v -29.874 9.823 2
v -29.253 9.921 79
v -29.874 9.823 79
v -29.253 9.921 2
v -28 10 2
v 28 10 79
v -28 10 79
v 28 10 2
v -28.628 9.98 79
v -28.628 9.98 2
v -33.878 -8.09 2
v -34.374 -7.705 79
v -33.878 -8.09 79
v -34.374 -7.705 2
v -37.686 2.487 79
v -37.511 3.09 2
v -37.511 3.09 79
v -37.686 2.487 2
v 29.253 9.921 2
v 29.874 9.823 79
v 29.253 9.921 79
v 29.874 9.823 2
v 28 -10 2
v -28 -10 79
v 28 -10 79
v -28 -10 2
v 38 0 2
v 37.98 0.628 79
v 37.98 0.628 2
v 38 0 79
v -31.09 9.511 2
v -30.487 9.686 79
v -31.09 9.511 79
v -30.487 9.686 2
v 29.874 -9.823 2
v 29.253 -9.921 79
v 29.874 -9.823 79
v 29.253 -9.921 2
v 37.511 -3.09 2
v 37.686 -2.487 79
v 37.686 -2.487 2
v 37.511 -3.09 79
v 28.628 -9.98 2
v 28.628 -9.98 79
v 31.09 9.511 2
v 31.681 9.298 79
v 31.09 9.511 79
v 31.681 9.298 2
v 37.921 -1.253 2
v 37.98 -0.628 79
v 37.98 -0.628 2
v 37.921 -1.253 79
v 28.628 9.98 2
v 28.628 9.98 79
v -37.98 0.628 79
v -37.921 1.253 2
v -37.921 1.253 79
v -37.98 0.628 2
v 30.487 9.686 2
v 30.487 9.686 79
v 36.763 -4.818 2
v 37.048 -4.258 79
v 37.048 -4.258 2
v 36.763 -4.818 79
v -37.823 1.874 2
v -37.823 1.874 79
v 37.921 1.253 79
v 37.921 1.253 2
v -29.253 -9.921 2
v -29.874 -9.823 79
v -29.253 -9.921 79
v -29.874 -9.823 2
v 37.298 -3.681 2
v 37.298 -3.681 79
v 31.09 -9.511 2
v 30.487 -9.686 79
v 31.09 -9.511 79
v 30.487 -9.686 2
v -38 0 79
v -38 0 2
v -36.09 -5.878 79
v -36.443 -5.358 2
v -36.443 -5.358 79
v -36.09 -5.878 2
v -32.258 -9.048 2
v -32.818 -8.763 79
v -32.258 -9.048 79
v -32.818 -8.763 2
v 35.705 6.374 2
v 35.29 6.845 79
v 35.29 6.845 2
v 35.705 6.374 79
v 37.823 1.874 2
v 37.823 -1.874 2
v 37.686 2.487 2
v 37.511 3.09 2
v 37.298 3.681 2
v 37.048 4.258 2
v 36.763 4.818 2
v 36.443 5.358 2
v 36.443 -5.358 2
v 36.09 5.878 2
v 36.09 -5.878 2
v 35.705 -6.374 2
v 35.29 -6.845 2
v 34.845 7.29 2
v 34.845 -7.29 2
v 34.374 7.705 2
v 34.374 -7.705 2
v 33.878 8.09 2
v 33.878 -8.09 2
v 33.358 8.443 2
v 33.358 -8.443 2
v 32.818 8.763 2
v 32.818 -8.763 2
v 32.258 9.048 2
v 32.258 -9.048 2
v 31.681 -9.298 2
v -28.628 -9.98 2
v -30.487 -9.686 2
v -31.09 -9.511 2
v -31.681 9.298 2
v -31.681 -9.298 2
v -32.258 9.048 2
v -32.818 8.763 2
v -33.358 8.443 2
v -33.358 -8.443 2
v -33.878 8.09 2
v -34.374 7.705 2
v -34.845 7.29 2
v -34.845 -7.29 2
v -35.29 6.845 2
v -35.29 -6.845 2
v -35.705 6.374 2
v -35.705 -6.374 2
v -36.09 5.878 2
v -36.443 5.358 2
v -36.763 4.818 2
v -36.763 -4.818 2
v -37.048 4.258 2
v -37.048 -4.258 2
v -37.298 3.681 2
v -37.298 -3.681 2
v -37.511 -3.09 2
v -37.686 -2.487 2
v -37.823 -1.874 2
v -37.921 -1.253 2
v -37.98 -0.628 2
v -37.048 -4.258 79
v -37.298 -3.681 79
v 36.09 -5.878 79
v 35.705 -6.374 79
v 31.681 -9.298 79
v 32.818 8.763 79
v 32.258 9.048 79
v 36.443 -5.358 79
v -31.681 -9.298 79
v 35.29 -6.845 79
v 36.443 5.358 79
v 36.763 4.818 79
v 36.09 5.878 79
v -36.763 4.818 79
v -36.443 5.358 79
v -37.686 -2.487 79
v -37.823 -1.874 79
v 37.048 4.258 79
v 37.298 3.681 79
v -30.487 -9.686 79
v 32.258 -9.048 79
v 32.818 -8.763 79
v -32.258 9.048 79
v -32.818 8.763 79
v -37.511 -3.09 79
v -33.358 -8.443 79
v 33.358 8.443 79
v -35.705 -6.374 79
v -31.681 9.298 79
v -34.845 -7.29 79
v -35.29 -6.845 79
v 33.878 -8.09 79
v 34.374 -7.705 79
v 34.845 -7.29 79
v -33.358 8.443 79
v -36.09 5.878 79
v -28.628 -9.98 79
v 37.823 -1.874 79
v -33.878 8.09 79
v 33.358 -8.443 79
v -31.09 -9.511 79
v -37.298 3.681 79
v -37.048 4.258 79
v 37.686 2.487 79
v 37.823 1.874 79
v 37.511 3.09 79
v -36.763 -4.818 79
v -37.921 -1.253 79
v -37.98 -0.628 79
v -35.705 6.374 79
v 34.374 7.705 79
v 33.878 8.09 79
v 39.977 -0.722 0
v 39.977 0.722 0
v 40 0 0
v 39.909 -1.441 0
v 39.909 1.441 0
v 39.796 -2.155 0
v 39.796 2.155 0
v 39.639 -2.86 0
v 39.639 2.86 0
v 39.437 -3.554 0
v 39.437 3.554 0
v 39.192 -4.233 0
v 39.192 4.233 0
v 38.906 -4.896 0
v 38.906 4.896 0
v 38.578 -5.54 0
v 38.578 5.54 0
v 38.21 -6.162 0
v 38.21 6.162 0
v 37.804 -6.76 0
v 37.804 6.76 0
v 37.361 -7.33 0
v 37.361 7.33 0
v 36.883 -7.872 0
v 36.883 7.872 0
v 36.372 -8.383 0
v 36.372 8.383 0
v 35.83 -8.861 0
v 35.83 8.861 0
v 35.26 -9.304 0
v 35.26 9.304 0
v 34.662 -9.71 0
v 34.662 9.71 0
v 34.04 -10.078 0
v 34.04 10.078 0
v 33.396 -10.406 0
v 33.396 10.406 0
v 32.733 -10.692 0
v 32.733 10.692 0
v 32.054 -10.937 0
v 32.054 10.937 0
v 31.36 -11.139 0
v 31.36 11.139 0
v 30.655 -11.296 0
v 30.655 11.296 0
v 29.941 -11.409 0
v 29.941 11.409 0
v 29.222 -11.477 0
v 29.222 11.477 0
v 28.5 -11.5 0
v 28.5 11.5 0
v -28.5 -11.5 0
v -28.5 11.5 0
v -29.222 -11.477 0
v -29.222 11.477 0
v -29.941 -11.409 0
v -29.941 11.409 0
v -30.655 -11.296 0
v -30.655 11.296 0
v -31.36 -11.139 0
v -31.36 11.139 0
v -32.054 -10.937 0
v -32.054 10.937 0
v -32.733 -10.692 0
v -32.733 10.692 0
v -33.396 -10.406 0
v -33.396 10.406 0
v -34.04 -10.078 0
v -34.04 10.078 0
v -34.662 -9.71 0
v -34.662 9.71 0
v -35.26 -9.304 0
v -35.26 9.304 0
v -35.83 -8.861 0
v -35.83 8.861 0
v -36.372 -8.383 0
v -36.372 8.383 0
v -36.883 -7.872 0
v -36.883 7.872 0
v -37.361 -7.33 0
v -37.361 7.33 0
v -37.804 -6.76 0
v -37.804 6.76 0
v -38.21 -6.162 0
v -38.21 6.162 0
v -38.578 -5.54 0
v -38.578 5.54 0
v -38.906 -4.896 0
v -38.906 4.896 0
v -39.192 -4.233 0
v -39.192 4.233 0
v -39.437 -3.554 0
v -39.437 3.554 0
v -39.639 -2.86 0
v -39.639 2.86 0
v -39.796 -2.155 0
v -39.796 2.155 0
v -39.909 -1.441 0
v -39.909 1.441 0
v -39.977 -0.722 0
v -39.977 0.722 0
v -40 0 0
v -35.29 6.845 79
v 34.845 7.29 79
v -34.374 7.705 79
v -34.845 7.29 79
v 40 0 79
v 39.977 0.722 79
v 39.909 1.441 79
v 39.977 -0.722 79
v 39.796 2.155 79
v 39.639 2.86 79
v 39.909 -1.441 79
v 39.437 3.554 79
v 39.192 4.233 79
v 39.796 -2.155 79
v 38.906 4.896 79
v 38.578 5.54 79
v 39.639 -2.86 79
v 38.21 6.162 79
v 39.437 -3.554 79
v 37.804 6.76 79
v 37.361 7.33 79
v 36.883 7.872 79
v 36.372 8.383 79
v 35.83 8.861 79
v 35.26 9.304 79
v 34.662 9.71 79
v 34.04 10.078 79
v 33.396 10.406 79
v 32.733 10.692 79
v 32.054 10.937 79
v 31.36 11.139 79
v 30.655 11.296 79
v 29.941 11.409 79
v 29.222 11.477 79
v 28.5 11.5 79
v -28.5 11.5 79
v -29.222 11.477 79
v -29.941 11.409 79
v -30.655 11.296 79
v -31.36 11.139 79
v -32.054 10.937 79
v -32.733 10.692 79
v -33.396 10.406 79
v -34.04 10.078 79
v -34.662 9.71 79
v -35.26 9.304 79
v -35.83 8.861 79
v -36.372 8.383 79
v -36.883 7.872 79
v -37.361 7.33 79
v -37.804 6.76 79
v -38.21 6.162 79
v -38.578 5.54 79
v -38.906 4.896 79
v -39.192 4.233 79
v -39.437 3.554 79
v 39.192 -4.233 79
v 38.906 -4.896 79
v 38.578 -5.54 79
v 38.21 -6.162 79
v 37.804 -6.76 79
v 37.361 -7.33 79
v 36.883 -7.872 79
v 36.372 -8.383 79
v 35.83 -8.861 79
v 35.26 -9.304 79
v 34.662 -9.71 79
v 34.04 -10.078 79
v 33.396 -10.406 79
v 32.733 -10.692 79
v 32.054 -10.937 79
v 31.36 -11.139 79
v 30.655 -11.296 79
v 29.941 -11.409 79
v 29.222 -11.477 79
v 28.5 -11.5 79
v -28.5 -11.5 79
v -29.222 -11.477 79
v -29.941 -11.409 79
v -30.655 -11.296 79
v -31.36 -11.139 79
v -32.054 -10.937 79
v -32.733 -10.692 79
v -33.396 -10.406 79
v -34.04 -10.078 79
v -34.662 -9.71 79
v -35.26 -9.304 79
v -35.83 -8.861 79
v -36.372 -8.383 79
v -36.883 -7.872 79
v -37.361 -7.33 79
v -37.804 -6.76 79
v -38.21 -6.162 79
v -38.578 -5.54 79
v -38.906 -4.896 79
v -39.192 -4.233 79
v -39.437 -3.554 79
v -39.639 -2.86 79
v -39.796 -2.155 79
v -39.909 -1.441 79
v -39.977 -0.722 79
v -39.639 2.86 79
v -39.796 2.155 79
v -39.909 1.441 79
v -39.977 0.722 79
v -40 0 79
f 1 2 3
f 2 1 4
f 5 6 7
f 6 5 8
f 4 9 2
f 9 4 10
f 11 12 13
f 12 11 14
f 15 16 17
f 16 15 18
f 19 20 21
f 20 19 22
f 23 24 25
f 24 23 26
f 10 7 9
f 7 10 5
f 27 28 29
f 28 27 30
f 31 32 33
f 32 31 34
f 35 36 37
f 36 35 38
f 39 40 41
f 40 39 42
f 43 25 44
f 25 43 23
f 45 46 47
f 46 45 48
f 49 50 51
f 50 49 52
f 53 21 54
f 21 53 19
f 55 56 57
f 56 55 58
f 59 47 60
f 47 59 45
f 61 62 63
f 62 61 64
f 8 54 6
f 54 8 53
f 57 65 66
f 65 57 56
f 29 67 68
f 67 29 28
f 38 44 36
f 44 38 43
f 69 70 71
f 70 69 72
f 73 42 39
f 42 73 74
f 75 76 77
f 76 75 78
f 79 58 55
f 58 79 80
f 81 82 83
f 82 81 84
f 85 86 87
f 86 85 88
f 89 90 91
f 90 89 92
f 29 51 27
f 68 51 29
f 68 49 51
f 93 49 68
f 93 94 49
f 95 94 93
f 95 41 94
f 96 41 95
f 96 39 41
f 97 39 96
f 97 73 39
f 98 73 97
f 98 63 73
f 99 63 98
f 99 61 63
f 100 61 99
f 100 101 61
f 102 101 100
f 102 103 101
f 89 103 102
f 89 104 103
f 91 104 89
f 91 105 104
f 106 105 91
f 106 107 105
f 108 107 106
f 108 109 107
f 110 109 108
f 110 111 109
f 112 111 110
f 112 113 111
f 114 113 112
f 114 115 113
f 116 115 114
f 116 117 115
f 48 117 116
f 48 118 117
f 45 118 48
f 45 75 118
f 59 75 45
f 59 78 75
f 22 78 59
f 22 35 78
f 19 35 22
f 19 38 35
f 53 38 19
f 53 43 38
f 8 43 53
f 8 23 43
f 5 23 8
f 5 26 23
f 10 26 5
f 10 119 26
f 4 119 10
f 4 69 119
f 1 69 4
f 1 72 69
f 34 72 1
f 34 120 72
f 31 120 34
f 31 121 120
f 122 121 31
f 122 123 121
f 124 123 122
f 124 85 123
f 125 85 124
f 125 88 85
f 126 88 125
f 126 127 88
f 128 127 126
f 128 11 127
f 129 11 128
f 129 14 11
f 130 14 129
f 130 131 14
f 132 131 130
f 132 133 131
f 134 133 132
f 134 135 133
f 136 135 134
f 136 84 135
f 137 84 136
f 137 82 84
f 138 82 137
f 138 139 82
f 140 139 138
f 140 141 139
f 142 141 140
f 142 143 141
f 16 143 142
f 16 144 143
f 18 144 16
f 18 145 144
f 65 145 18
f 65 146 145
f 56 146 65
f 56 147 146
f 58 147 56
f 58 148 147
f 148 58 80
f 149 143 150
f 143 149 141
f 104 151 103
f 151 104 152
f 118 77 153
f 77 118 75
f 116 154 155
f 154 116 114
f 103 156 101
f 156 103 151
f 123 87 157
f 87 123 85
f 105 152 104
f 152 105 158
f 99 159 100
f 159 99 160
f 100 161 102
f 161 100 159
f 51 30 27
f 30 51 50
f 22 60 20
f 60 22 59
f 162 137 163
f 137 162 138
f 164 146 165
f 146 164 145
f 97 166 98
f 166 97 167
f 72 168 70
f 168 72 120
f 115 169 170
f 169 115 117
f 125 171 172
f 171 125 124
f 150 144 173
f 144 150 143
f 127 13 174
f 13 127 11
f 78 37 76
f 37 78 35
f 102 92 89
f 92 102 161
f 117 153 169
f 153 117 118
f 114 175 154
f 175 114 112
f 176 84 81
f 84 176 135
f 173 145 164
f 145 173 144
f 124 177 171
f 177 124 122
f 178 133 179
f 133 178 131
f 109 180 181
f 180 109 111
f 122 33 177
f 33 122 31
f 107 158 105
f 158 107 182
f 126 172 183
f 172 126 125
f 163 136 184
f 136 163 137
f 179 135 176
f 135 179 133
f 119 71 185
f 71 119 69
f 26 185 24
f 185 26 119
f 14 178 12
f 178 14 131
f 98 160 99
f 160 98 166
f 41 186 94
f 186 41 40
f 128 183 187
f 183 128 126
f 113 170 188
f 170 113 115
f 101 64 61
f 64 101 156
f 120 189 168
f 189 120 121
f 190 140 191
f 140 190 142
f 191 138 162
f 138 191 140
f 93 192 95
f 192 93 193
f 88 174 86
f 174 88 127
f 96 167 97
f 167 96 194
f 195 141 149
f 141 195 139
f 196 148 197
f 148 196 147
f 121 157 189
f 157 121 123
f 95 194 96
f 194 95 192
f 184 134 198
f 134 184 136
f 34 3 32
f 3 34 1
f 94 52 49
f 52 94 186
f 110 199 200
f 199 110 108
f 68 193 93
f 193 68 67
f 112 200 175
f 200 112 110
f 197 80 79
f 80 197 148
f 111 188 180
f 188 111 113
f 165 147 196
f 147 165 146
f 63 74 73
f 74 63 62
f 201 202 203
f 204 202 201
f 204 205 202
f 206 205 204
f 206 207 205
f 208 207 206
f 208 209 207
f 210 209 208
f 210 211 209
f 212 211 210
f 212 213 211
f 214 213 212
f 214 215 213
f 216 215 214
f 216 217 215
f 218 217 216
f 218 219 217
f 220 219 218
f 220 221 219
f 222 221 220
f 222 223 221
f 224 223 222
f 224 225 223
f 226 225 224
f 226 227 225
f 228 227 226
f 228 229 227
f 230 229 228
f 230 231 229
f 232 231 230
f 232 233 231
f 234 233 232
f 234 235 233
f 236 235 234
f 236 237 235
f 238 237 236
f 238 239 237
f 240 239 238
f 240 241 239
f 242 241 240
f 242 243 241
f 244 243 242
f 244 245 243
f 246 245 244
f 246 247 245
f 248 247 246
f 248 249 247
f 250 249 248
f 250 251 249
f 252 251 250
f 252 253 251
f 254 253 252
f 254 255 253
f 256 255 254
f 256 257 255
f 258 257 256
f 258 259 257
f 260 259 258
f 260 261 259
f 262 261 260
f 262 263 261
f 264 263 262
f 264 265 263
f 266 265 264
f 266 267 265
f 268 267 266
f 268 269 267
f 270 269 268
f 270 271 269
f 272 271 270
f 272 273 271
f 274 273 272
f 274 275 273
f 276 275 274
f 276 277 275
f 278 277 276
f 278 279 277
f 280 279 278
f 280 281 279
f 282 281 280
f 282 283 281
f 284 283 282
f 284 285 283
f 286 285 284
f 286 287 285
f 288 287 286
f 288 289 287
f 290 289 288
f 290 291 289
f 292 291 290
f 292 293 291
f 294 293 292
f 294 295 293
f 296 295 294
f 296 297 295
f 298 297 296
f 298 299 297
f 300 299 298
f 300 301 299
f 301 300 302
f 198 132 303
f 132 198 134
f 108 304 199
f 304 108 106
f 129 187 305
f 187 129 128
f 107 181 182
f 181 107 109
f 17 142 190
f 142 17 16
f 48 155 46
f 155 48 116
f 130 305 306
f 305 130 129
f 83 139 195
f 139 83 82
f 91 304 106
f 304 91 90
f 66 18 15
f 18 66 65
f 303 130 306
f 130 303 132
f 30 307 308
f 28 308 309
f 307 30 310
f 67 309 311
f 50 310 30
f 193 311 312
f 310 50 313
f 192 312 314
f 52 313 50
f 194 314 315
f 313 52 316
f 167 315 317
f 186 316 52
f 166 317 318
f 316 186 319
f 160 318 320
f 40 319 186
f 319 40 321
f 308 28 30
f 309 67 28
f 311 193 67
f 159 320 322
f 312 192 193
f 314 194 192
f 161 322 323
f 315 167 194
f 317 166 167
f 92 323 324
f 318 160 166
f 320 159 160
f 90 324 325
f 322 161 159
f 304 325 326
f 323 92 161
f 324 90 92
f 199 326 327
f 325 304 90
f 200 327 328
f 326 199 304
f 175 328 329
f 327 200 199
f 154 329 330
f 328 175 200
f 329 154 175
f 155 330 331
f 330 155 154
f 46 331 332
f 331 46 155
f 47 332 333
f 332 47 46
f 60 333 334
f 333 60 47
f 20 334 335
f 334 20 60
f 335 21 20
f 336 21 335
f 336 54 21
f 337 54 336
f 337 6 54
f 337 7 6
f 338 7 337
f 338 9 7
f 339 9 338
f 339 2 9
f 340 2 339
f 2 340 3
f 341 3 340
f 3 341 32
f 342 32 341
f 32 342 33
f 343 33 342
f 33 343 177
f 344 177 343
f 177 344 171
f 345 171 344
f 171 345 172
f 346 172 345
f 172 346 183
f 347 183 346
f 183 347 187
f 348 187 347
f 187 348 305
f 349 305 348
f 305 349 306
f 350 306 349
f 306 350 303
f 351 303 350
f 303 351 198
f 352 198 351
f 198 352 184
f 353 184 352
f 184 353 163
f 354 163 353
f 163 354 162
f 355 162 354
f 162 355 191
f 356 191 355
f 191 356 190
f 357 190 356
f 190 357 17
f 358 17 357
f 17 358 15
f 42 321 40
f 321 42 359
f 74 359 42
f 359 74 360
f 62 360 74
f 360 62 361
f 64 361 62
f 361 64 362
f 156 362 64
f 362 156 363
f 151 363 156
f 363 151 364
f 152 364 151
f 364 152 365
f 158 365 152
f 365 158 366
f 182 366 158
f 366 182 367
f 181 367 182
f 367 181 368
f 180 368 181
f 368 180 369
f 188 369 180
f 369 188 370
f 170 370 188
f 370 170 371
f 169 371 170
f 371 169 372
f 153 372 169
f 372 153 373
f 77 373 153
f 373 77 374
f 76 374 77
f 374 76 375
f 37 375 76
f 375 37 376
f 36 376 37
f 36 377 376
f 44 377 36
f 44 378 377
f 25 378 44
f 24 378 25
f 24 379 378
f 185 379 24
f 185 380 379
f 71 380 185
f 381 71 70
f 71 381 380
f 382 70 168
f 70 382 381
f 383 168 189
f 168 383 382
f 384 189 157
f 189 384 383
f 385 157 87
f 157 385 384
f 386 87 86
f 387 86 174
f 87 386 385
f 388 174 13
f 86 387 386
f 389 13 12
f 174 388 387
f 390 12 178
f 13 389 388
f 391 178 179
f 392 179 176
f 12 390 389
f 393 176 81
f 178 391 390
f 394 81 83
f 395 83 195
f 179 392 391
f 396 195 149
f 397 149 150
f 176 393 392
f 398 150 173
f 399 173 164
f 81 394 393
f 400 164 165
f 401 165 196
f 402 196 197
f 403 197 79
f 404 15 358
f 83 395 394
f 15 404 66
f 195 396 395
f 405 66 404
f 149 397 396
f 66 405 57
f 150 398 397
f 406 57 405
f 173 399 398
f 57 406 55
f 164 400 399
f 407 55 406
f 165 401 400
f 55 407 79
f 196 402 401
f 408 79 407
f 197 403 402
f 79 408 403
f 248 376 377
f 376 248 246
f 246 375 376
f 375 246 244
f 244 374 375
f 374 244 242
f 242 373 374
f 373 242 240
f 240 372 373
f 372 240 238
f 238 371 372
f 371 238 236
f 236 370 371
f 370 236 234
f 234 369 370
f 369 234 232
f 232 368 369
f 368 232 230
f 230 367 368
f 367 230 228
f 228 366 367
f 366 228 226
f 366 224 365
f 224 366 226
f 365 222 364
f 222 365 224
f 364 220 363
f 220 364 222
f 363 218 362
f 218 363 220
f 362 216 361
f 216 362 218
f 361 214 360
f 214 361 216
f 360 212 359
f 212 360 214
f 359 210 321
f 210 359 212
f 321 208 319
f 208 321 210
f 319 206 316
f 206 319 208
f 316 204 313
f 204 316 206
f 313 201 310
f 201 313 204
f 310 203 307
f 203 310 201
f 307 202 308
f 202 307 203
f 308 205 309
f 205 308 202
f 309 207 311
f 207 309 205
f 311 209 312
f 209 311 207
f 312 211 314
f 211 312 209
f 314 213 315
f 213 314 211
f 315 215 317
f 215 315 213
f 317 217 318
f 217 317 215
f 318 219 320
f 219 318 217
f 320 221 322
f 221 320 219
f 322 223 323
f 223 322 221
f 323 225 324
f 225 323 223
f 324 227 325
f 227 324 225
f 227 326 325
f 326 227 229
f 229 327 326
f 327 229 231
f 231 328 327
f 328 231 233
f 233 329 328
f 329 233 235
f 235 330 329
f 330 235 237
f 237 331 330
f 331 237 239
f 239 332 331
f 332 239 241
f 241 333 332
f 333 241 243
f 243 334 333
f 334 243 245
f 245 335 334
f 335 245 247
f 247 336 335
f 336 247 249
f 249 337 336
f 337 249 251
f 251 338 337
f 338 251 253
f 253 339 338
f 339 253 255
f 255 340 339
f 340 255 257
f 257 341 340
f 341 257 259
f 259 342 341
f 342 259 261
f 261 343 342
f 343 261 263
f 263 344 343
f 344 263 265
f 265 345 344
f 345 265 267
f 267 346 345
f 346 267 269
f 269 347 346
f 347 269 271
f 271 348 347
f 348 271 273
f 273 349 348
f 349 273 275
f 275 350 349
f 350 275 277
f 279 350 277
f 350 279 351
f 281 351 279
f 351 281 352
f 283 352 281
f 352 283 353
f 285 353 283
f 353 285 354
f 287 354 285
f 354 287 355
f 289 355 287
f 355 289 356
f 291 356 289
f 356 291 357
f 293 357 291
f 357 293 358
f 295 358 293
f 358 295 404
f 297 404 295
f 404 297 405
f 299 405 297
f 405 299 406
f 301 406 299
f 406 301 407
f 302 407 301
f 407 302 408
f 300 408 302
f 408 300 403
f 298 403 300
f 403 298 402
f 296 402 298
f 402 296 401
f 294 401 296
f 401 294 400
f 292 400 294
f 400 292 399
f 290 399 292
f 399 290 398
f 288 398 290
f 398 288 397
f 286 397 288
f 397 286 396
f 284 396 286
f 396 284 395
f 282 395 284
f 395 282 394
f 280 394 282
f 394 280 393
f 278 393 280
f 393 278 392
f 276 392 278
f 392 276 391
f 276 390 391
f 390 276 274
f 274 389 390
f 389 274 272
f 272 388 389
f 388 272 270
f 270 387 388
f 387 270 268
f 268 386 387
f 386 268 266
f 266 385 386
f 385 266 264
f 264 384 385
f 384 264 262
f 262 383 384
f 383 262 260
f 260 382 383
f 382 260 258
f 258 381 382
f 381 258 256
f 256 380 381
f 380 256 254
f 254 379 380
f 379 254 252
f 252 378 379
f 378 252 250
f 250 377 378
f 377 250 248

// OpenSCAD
//h = 77; + 2mm base

$fn = 100;

// cell 18.5 * 4 = 74
// 19 x 75 

module myshape(l, w) {
    w_half = w/2;
    l_half = l/2;
    union() {
        square(size=[l - w, w], center=true);

        
            translate([w_half - l_half, 0, 0])
                circle(d=w);

            translate([-w_half + l_half, 0, 0])
                circle(d=w);
        
    }
}



// base
linear_extrude(height=2)
    myshape(76, 20);

// side
linear_extrude(height=77 +2)
    difference(){
         myshape(80, 23); // 80 ok
         myshape(76, 20); // 76 ok
    }
